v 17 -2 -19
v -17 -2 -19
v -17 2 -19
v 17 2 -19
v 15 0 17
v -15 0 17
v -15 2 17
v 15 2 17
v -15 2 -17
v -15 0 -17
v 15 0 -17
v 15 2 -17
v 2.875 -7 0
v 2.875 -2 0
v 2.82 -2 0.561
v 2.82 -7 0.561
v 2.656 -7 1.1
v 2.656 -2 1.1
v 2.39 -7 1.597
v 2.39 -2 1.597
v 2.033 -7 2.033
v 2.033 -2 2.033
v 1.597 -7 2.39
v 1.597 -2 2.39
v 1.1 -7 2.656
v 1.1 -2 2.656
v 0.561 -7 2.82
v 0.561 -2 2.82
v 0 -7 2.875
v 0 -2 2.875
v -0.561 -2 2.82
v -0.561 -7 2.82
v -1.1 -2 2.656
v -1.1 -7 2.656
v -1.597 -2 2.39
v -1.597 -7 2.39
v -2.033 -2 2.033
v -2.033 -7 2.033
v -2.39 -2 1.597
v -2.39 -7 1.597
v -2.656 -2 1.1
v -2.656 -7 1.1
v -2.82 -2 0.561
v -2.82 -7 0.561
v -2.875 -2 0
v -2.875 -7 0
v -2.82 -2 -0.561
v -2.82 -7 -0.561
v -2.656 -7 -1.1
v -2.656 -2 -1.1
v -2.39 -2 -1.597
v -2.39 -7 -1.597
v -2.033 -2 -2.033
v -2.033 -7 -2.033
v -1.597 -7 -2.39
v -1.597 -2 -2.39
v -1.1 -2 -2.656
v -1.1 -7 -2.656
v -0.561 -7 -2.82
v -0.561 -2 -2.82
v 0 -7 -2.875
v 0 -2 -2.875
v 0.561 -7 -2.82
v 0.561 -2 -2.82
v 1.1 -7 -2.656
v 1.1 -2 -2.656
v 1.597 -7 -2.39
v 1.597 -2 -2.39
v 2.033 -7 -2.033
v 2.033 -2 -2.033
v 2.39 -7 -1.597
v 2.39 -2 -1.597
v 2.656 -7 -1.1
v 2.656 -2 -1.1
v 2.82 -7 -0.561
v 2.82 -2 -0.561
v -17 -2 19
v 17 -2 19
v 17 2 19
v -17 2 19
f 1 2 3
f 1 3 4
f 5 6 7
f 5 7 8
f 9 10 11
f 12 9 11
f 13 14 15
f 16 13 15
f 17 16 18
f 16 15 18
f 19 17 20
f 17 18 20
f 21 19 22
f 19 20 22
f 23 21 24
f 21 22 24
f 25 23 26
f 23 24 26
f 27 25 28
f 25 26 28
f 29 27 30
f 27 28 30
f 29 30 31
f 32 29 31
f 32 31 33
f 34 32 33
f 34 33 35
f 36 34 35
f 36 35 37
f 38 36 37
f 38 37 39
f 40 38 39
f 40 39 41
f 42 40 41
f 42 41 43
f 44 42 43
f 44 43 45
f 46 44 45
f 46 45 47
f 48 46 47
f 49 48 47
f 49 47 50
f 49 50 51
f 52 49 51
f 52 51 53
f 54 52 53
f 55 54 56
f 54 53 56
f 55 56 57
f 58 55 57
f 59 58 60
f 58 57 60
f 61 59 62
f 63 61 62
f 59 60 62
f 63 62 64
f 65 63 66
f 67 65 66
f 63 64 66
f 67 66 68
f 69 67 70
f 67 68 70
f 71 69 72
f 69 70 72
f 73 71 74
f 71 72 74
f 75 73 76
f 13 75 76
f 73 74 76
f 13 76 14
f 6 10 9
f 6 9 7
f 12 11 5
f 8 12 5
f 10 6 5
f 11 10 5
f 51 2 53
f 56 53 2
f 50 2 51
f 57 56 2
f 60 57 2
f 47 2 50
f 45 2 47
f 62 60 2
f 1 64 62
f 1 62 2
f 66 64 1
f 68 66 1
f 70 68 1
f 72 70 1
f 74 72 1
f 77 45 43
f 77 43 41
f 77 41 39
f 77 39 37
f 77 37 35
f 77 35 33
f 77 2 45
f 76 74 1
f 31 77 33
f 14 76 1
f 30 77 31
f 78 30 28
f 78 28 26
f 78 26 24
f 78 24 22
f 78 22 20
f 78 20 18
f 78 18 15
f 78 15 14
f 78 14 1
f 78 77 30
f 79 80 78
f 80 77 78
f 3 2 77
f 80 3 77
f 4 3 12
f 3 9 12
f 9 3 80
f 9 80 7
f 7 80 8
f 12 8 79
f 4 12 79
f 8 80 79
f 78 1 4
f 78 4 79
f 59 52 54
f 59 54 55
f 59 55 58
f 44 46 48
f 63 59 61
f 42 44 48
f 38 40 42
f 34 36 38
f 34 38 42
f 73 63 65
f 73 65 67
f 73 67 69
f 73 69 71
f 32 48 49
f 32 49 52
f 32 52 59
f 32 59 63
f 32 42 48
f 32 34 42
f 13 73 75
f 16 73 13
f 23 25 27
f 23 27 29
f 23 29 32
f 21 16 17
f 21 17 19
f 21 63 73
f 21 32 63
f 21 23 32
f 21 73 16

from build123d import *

# Parameters (mm, degrees)
F0_W     = 34
F0_H     = 38
F0_W_2   = 30
F0_H_2   = 34
F1_DEPTH = 2
F2_R     = 2.875
F3_DEPTH = 7
F4_DEPTH = 2


with BuildPart() as f1:
    # F0 (on Front) → F1 (new body)
    with BuildSketch(Plane.XZ):
        Rectangle(F0_W, F0_H)
        Rectangle(F0_W_2, F0_H_2, mode=Mode.SUBTRACT)
        Rectangle(F0_W_2, F0_H_2)
    extrude(amount=F1_DEPTH)

    # F2 (on Front) → F3 (join)
    with BuildSketch(Plane.XZ):
        Circle(F2_R)
    extrude(amount=F3_DEPTH)

    # F0 (on Front) → F4 (join)
    with BuildSketch(Plane.XZ):
        Rectangle(F0_W, F0_H)
        Rectangle(F0_W_2, F0_H_2, mode=Mode.SUBTRACT)
    extrude(amount=-F4_DEPTH)


solid = f1.part
